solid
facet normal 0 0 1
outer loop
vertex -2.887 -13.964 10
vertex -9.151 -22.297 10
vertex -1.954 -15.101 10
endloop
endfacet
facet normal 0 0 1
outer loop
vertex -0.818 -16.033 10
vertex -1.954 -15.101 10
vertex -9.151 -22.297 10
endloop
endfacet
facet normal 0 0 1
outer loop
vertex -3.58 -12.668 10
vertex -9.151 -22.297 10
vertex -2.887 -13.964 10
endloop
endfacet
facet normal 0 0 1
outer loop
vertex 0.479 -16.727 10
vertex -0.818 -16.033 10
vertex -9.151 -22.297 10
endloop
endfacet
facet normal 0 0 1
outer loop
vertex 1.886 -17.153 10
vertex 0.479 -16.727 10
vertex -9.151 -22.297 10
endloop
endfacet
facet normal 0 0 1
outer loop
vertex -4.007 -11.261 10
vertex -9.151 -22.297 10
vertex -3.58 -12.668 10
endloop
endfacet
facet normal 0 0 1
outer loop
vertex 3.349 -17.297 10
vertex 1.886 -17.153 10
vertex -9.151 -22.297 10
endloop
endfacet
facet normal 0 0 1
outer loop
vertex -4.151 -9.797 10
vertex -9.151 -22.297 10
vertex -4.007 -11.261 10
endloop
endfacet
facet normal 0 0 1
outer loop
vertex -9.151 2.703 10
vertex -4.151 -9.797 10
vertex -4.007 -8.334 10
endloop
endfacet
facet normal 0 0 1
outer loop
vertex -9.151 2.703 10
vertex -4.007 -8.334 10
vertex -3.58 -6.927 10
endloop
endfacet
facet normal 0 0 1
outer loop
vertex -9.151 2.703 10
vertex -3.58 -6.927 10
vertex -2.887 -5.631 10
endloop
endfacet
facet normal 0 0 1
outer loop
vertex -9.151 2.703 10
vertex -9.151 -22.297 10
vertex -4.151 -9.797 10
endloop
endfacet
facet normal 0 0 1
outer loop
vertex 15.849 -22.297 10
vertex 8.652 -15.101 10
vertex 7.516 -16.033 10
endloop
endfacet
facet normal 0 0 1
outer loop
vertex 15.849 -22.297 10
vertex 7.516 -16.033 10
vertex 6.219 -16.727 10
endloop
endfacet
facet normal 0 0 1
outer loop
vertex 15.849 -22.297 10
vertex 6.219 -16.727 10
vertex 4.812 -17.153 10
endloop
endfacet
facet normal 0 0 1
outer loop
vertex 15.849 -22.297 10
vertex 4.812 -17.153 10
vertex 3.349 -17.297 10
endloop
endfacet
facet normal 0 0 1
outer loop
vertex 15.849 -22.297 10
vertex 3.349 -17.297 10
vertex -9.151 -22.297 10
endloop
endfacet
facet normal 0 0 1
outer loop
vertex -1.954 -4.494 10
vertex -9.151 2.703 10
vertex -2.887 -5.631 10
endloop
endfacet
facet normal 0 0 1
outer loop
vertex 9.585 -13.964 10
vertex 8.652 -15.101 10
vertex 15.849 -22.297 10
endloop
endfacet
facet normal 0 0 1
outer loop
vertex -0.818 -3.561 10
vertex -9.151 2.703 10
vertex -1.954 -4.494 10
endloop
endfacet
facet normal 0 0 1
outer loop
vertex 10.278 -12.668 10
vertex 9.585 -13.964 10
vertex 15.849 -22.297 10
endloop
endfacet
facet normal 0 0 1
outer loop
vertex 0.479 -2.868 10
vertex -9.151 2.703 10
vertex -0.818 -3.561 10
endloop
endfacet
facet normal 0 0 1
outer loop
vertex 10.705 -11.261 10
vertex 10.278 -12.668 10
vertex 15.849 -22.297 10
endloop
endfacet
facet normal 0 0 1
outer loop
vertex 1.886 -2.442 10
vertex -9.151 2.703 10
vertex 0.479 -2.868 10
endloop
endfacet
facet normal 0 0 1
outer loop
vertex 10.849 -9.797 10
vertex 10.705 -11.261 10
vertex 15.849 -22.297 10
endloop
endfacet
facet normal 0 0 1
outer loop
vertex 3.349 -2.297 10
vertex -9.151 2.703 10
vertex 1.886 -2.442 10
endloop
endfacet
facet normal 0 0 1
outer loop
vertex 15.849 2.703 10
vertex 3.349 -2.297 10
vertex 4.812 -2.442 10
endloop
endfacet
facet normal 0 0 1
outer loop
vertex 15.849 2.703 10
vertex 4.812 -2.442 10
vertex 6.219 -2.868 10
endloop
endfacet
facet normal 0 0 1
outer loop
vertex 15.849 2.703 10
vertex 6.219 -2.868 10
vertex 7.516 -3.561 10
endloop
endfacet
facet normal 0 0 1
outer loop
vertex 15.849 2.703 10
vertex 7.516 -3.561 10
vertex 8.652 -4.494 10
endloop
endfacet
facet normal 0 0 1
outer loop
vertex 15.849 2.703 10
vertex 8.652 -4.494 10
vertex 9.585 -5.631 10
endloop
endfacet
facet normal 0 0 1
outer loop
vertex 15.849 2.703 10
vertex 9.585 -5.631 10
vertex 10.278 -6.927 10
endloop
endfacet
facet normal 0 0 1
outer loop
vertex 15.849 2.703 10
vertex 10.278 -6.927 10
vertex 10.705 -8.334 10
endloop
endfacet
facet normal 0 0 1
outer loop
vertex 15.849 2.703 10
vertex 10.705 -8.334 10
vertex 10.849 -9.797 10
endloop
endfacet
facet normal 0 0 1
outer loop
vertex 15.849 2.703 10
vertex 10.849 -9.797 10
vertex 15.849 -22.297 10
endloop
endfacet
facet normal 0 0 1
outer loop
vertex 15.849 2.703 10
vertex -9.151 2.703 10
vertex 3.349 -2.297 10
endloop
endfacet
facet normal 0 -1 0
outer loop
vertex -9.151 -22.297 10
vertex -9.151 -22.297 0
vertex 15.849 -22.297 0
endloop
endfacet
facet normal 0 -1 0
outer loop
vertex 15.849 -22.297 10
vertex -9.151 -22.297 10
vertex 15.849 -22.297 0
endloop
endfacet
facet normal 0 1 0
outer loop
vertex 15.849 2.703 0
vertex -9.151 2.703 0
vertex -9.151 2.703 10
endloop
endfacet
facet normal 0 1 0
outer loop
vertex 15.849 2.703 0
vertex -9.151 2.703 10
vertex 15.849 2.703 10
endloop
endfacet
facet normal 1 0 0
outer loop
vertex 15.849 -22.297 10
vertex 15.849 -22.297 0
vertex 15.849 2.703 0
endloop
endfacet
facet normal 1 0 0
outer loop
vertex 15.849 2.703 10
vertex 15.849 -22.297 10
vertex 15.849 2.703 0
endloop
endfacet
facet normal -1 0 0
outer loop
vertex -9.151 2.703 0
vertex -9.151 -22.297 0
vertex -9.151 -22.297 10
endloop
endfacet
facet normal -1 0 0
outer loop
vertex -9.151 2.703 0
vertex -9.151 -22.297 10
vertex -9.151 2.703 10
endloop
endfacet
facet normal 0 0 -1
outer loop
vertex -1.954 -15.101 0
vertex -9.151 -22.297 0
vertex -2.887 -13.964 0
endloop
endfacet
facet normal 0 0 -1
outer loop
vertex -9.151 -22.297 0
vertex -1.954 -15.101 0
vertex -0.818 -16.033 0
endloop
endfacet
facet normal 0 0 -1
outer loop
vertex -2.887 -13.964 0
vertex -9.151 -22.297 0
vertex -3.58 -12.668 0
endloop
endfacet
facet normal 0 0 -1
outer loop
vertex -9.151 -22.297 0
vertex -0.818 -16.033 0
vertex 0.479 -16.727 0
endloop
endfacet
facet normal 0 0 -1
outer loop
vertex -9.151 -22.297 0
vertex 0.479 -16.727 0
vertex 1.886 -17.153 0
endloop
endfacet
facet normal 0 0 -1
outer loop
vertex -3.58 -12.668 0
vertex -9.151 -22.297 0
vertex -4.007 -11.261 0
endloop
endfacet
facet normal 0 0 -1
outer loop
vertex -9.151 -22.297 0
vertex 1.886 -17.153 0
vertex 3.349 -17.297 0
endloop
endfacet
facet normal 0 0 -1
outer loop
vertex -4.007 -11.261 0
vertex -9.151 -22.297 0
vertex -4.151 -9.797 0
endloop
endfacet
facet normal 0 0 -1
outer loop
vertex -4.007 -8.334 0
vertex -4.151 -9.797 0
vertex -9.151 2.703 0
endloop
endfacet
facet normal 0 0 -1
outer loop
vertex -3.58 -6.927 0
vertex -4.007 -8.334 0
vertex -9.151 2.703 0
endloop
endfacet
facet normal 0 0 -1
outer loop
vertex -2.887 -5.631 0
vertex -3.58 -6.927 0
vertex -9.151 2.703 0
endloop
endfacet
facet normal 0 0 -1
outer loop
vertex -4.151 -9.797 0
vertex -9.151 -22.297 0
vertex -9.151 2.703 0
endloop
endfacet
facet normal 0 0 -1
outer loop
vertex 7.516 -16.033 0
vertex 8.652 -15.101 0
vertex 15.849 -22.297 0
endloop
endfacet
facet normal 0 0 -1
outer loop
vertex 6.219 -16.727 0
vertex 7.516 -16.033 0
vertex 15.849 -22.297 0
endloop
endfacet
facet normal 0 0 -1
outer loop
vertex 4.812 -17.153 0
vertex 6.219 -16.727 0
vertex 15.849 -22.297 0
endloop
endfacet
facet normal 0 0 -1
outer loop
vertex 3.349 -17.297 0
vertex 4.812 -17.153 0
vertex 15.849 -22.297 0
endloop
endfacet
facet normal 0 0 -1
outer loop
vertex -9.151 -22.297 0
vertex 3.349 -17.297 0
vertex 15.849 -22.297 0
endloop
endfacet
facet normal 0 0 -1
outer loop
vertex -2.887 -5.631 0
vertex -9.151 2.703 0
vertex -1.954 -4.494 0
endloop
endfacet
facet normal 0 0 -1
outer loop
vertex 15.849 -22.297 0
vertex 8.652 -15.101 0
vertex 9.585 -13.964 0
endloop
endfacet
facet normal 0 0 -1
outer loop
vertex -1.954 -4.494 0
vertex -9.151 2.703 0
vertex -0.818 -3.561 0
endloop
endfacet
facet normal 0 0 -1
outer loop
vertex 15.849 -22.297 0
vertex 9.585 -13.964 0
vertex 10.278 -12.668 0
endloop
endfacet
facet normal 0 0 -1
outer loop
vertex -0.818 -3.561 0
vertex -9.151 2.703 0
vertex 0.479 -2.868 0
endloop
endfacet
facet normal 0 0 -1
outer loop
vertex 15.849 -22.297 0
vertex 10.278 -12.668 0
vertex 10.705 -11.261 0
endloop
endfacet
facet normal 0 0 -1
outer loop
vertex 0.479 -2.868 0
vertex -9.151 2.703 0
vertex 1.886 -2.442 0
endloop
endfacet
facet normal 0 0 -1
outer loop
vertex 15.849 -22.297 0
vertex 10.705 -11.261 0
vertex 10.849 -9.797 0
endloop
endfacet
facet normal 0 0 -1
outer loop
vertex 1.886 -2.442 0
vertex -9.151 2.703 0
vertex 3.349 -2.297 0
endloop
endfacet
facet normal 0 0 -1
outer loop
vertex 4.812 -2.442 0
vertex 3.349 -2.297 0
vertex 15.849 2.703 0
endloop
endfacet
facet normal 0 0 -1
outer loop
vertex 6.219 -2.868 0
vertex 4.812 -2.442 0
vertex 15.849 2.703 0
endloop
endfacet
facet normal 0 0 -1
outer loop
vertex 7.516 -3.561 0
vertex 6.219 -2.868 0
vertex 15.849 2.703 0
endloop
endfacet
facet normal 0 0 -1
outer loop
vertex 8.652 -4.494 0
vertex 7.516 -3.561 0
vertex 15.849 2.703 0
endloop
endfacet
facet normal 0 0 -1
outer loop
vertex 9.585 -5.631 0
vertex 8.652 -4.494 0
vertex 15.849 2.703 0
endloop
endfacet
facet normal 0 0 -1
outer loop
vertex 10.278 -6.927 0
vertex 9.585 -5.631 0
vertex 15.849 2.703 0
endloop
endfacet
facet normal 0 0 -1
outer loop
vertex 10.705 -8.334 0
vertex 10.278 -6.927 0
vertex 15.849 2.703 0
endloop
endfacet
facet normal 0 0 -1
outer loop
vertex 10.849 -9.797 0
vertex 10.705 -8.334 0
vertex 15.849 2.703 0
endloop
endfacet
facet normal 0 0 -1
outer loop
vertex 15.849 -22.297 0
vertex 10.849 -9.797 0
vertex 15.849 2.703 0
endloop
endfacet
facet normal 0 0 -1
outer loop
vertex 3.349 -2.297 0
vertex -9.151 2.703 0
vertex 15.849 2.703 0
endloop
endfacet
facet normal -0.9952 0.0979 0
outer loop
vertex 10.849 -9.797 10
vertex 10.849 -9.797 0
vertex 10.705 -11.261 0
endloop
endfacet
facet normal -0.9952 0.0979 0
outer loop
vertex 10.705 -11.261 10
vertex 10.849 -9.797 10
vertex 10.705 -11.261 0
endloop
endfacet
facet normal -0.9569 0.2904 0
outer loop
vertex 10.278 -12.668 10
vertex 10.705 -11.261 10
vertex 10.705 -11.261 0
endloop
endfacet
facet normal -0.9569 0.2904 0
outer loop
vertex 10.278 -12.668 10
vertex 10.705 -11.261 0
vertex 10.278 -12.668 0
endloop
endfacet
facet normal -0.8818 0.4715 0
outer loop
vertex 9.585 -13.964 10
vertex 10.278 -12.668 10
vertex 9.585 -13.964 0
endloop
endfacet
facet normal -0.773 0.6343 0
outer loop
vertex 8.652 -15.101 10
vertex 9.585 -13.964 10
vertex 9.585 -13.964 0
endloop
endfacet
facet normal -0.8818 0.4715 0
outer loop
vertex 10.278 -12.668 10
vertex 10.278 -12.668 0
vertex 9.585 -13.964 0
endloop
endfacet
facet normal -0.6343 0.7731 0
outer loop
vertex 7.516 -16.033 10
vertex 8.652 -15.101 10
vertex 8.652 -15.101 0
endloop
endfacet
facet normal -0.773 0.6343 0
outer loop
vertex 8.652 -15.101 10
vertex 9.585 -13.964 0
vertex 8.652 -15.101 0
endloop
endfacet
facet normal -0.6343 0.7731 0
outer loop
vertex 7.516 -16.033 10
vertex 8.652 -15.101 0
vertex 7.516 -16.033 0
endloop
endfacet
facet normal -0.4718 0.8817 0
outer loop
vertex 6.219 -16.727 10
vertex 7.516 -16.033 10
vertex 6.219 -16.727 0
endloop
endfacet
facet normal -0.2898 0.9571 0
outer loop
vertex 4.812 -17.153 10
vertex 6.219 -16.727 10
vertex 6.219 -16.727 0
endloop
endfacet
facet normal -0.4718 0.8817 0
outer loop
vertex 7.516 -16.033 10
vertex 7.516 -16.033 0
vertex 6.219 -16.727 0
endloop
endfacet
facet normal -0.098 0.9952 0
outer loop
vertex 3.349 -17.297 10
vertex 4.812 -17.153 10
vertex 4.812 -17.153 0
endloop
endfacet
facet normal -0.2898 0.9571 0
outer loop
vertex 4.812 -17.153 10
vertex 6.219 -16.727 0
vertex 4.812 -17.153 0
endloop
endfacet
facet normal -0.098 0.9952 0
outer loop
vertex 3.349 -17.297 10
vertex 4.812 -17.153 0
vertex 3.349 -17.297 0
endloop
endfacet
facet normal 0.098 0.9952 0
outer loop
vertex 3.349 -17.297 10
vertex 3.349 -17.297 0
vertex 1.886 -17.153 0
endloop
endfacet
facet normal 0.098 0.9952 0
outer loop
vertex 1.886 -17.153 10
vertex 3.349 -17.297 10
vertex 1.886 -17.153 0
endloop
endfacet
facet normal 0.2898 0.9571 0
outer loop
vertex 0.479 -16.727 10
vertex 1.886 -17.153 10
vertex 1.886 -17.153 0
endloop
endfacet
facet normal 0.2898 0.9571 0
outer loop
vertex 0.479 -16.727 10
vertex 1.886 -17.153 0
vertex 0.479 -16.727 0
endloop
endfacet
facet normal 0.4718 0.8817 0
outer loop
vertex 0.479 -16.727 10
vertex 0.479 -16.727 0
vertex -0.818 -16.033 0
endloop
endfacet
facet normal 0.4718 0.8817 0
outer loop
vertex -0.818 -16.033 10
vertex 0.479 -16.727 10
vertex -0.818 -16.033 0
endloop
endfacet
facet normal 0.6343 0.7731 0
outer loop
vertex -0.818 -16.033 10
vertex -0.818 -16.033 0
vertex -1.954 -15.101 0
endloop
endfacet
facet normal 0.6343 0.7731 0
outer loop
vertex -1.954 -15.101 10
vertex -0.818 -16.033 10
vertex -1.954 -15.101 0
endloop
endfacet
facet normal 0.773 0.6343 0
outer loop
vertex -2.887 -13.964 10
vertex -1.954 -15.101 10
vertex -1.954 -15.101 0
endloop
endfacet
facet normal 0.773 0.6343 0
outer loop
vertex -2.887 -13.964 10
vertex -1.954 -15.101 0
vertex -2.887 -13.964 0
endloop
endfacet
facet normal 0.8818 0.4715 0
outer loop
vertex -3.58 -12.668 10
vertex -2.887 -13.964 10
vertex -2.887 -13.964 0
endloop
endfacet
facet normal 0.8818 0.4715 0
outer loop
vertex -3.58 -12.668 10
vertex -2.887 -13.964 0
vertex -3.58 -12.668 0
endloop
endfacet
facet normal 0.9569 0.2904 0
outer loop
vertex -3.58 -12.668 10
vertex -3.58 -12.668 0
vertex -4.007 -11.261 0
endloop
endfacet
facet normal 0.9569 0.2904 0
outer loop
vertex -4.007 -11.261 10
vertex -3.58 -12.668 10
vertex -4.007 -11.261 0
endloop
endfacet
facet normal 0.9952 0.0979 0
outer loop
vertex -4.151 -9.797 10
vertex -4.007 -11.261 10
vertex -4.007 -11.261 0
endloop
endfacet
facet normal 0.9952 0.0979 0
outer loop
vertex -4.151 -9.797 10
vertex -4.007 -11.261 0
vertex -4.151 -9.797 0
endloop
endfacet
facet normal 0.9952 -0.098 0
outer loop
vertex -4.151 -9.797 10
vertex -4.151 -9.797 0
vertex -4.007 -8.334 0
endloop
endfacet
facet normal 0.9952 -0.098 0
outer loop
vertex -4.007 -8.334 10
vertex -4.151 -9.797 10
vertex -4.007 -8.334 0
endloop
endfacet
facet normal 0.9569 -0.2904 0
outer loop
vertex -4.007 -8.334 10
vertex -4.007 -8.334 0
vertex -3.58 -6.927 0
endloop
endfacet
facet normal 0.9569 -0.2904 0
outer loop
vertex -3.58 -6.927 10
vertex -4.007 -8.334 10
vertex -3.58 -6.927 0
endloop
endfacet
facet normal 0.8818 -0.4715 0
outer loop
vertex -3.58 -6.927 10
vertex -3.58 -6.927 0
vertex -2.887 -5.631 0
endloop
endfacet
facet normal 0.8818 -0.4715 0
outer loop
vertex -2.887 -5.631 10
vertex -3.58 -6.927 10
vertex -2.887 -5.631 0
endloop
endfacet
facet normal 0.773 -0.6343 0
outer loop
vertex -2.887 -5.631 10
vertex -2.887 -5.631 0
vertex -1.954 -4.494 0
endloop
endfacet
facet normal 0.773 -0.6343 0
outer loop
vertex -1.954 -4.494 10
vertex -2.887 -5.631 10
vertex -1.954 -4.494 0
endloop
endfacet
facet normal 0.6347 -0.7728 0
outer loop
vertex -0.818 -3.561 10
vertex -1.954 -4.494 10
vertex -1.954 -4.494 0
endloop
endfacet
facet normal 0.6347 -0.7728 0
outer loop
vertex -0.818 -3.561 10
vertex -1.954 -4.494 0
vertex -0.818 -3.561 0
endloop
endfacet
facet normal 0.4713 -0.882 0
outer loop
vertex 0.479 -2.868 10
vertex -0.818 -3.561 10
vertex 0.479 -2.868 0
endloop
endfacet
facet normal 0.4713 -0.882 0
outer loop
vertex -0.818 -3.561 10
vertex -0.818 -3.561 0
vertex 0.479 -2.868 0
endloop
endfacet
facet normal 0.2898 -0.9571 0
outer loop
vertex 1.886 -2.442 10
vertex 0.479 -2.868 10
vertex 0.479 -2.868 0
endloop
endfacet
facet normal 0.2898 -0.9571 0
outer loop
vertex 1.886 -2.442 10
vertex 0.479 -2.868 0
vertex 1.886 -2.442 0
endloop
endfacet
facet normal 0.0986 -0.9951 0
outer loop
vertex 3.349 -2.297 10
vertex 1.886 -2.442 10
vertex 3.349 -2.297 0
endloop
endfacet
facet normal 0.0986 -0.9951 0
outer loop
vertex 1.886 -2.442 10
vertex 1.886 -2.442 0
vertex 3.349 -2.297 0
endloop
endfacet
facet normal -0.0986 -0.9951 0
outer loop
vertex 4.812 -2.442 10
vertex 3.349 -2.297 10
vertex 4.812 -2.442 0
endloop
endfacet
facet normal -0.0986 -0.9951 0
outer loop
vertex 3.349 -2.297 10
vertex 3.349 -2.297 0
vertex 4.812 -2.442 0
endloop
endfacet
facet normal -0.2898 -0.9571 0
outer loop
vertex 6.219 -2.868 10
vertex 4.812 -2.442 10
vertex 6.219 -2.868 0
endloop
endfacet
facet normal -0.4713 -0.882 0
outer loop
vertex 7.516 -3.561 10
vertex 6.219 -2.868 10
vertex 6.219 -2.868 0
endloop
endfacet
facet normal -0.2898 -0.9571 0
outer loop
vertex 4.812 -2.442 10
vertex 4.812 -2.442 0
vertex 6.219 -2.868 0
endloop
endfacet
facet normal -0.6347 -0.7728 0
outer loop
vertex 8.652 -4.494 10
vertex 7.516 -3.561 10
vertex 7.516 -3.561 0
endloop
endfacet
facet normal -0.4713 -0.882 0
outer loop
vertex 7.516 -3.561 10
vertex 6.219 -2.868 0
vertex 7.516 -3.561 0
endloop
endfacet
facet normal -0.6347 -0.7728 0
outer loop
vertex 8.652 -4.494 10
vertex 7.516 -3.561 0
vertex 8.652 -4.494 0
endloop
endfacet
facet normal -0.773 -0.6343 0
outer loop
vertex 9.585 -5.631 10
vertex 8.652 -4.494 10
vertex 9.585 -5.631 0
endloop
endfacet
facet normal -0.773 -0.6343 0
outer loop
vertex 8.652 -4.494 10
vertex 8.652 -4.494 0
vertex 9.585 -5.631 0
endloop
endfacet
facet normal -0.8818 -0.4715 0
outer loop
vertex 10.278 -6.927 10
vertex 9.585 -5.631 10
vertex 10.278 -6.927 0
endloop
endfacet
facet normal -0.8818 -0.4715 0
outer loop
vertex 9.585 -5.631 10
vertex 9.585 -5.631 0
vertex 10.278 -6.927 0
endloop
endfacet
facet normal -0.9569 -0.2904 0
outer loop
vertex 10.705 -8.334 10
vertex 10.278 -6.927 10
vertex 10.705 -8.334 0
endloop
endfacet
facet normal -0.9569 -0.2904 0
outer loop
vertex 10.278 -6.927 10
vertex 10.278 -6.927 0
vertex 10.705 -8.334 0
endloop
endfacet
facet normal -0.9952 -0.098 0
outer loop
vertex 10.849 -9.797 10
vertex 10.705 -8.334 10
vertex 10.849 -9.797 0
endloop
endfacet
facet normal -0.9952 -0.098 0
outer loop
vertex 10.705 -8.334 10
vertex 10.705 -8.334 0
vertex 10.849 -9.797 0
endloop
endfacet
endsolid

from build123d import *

# Parameters (mm, degrees)
F0_W     = 25
F0_H     = 25
F1_DEPTH = 10
F2_R     = 7.5
F3_DEPTH = 10.001


with BuildPart() as f1:
    # F0 (on Top) → F1 (new body)
    with BuildSketch(Plane.XY):
        with Locations((3.349018, -9.797464)):
            Rectangle(F0_W, F0_H)
    extrude(amount=F1_DEPTH)

    # F2 (on face) → F3 (cut, through all)
    with BuildSketch(Plane(origin=(0, 0, 0), x_dir=(1, 0, 0), z_dir=(0, 0, -1))):
        with Locations((3.349018, 9.797464)):
            Circle(F2_R)
    extrude(amount=-F3_DEPTH, mode=Mode.SUBTRACT)


solid = f1.part
